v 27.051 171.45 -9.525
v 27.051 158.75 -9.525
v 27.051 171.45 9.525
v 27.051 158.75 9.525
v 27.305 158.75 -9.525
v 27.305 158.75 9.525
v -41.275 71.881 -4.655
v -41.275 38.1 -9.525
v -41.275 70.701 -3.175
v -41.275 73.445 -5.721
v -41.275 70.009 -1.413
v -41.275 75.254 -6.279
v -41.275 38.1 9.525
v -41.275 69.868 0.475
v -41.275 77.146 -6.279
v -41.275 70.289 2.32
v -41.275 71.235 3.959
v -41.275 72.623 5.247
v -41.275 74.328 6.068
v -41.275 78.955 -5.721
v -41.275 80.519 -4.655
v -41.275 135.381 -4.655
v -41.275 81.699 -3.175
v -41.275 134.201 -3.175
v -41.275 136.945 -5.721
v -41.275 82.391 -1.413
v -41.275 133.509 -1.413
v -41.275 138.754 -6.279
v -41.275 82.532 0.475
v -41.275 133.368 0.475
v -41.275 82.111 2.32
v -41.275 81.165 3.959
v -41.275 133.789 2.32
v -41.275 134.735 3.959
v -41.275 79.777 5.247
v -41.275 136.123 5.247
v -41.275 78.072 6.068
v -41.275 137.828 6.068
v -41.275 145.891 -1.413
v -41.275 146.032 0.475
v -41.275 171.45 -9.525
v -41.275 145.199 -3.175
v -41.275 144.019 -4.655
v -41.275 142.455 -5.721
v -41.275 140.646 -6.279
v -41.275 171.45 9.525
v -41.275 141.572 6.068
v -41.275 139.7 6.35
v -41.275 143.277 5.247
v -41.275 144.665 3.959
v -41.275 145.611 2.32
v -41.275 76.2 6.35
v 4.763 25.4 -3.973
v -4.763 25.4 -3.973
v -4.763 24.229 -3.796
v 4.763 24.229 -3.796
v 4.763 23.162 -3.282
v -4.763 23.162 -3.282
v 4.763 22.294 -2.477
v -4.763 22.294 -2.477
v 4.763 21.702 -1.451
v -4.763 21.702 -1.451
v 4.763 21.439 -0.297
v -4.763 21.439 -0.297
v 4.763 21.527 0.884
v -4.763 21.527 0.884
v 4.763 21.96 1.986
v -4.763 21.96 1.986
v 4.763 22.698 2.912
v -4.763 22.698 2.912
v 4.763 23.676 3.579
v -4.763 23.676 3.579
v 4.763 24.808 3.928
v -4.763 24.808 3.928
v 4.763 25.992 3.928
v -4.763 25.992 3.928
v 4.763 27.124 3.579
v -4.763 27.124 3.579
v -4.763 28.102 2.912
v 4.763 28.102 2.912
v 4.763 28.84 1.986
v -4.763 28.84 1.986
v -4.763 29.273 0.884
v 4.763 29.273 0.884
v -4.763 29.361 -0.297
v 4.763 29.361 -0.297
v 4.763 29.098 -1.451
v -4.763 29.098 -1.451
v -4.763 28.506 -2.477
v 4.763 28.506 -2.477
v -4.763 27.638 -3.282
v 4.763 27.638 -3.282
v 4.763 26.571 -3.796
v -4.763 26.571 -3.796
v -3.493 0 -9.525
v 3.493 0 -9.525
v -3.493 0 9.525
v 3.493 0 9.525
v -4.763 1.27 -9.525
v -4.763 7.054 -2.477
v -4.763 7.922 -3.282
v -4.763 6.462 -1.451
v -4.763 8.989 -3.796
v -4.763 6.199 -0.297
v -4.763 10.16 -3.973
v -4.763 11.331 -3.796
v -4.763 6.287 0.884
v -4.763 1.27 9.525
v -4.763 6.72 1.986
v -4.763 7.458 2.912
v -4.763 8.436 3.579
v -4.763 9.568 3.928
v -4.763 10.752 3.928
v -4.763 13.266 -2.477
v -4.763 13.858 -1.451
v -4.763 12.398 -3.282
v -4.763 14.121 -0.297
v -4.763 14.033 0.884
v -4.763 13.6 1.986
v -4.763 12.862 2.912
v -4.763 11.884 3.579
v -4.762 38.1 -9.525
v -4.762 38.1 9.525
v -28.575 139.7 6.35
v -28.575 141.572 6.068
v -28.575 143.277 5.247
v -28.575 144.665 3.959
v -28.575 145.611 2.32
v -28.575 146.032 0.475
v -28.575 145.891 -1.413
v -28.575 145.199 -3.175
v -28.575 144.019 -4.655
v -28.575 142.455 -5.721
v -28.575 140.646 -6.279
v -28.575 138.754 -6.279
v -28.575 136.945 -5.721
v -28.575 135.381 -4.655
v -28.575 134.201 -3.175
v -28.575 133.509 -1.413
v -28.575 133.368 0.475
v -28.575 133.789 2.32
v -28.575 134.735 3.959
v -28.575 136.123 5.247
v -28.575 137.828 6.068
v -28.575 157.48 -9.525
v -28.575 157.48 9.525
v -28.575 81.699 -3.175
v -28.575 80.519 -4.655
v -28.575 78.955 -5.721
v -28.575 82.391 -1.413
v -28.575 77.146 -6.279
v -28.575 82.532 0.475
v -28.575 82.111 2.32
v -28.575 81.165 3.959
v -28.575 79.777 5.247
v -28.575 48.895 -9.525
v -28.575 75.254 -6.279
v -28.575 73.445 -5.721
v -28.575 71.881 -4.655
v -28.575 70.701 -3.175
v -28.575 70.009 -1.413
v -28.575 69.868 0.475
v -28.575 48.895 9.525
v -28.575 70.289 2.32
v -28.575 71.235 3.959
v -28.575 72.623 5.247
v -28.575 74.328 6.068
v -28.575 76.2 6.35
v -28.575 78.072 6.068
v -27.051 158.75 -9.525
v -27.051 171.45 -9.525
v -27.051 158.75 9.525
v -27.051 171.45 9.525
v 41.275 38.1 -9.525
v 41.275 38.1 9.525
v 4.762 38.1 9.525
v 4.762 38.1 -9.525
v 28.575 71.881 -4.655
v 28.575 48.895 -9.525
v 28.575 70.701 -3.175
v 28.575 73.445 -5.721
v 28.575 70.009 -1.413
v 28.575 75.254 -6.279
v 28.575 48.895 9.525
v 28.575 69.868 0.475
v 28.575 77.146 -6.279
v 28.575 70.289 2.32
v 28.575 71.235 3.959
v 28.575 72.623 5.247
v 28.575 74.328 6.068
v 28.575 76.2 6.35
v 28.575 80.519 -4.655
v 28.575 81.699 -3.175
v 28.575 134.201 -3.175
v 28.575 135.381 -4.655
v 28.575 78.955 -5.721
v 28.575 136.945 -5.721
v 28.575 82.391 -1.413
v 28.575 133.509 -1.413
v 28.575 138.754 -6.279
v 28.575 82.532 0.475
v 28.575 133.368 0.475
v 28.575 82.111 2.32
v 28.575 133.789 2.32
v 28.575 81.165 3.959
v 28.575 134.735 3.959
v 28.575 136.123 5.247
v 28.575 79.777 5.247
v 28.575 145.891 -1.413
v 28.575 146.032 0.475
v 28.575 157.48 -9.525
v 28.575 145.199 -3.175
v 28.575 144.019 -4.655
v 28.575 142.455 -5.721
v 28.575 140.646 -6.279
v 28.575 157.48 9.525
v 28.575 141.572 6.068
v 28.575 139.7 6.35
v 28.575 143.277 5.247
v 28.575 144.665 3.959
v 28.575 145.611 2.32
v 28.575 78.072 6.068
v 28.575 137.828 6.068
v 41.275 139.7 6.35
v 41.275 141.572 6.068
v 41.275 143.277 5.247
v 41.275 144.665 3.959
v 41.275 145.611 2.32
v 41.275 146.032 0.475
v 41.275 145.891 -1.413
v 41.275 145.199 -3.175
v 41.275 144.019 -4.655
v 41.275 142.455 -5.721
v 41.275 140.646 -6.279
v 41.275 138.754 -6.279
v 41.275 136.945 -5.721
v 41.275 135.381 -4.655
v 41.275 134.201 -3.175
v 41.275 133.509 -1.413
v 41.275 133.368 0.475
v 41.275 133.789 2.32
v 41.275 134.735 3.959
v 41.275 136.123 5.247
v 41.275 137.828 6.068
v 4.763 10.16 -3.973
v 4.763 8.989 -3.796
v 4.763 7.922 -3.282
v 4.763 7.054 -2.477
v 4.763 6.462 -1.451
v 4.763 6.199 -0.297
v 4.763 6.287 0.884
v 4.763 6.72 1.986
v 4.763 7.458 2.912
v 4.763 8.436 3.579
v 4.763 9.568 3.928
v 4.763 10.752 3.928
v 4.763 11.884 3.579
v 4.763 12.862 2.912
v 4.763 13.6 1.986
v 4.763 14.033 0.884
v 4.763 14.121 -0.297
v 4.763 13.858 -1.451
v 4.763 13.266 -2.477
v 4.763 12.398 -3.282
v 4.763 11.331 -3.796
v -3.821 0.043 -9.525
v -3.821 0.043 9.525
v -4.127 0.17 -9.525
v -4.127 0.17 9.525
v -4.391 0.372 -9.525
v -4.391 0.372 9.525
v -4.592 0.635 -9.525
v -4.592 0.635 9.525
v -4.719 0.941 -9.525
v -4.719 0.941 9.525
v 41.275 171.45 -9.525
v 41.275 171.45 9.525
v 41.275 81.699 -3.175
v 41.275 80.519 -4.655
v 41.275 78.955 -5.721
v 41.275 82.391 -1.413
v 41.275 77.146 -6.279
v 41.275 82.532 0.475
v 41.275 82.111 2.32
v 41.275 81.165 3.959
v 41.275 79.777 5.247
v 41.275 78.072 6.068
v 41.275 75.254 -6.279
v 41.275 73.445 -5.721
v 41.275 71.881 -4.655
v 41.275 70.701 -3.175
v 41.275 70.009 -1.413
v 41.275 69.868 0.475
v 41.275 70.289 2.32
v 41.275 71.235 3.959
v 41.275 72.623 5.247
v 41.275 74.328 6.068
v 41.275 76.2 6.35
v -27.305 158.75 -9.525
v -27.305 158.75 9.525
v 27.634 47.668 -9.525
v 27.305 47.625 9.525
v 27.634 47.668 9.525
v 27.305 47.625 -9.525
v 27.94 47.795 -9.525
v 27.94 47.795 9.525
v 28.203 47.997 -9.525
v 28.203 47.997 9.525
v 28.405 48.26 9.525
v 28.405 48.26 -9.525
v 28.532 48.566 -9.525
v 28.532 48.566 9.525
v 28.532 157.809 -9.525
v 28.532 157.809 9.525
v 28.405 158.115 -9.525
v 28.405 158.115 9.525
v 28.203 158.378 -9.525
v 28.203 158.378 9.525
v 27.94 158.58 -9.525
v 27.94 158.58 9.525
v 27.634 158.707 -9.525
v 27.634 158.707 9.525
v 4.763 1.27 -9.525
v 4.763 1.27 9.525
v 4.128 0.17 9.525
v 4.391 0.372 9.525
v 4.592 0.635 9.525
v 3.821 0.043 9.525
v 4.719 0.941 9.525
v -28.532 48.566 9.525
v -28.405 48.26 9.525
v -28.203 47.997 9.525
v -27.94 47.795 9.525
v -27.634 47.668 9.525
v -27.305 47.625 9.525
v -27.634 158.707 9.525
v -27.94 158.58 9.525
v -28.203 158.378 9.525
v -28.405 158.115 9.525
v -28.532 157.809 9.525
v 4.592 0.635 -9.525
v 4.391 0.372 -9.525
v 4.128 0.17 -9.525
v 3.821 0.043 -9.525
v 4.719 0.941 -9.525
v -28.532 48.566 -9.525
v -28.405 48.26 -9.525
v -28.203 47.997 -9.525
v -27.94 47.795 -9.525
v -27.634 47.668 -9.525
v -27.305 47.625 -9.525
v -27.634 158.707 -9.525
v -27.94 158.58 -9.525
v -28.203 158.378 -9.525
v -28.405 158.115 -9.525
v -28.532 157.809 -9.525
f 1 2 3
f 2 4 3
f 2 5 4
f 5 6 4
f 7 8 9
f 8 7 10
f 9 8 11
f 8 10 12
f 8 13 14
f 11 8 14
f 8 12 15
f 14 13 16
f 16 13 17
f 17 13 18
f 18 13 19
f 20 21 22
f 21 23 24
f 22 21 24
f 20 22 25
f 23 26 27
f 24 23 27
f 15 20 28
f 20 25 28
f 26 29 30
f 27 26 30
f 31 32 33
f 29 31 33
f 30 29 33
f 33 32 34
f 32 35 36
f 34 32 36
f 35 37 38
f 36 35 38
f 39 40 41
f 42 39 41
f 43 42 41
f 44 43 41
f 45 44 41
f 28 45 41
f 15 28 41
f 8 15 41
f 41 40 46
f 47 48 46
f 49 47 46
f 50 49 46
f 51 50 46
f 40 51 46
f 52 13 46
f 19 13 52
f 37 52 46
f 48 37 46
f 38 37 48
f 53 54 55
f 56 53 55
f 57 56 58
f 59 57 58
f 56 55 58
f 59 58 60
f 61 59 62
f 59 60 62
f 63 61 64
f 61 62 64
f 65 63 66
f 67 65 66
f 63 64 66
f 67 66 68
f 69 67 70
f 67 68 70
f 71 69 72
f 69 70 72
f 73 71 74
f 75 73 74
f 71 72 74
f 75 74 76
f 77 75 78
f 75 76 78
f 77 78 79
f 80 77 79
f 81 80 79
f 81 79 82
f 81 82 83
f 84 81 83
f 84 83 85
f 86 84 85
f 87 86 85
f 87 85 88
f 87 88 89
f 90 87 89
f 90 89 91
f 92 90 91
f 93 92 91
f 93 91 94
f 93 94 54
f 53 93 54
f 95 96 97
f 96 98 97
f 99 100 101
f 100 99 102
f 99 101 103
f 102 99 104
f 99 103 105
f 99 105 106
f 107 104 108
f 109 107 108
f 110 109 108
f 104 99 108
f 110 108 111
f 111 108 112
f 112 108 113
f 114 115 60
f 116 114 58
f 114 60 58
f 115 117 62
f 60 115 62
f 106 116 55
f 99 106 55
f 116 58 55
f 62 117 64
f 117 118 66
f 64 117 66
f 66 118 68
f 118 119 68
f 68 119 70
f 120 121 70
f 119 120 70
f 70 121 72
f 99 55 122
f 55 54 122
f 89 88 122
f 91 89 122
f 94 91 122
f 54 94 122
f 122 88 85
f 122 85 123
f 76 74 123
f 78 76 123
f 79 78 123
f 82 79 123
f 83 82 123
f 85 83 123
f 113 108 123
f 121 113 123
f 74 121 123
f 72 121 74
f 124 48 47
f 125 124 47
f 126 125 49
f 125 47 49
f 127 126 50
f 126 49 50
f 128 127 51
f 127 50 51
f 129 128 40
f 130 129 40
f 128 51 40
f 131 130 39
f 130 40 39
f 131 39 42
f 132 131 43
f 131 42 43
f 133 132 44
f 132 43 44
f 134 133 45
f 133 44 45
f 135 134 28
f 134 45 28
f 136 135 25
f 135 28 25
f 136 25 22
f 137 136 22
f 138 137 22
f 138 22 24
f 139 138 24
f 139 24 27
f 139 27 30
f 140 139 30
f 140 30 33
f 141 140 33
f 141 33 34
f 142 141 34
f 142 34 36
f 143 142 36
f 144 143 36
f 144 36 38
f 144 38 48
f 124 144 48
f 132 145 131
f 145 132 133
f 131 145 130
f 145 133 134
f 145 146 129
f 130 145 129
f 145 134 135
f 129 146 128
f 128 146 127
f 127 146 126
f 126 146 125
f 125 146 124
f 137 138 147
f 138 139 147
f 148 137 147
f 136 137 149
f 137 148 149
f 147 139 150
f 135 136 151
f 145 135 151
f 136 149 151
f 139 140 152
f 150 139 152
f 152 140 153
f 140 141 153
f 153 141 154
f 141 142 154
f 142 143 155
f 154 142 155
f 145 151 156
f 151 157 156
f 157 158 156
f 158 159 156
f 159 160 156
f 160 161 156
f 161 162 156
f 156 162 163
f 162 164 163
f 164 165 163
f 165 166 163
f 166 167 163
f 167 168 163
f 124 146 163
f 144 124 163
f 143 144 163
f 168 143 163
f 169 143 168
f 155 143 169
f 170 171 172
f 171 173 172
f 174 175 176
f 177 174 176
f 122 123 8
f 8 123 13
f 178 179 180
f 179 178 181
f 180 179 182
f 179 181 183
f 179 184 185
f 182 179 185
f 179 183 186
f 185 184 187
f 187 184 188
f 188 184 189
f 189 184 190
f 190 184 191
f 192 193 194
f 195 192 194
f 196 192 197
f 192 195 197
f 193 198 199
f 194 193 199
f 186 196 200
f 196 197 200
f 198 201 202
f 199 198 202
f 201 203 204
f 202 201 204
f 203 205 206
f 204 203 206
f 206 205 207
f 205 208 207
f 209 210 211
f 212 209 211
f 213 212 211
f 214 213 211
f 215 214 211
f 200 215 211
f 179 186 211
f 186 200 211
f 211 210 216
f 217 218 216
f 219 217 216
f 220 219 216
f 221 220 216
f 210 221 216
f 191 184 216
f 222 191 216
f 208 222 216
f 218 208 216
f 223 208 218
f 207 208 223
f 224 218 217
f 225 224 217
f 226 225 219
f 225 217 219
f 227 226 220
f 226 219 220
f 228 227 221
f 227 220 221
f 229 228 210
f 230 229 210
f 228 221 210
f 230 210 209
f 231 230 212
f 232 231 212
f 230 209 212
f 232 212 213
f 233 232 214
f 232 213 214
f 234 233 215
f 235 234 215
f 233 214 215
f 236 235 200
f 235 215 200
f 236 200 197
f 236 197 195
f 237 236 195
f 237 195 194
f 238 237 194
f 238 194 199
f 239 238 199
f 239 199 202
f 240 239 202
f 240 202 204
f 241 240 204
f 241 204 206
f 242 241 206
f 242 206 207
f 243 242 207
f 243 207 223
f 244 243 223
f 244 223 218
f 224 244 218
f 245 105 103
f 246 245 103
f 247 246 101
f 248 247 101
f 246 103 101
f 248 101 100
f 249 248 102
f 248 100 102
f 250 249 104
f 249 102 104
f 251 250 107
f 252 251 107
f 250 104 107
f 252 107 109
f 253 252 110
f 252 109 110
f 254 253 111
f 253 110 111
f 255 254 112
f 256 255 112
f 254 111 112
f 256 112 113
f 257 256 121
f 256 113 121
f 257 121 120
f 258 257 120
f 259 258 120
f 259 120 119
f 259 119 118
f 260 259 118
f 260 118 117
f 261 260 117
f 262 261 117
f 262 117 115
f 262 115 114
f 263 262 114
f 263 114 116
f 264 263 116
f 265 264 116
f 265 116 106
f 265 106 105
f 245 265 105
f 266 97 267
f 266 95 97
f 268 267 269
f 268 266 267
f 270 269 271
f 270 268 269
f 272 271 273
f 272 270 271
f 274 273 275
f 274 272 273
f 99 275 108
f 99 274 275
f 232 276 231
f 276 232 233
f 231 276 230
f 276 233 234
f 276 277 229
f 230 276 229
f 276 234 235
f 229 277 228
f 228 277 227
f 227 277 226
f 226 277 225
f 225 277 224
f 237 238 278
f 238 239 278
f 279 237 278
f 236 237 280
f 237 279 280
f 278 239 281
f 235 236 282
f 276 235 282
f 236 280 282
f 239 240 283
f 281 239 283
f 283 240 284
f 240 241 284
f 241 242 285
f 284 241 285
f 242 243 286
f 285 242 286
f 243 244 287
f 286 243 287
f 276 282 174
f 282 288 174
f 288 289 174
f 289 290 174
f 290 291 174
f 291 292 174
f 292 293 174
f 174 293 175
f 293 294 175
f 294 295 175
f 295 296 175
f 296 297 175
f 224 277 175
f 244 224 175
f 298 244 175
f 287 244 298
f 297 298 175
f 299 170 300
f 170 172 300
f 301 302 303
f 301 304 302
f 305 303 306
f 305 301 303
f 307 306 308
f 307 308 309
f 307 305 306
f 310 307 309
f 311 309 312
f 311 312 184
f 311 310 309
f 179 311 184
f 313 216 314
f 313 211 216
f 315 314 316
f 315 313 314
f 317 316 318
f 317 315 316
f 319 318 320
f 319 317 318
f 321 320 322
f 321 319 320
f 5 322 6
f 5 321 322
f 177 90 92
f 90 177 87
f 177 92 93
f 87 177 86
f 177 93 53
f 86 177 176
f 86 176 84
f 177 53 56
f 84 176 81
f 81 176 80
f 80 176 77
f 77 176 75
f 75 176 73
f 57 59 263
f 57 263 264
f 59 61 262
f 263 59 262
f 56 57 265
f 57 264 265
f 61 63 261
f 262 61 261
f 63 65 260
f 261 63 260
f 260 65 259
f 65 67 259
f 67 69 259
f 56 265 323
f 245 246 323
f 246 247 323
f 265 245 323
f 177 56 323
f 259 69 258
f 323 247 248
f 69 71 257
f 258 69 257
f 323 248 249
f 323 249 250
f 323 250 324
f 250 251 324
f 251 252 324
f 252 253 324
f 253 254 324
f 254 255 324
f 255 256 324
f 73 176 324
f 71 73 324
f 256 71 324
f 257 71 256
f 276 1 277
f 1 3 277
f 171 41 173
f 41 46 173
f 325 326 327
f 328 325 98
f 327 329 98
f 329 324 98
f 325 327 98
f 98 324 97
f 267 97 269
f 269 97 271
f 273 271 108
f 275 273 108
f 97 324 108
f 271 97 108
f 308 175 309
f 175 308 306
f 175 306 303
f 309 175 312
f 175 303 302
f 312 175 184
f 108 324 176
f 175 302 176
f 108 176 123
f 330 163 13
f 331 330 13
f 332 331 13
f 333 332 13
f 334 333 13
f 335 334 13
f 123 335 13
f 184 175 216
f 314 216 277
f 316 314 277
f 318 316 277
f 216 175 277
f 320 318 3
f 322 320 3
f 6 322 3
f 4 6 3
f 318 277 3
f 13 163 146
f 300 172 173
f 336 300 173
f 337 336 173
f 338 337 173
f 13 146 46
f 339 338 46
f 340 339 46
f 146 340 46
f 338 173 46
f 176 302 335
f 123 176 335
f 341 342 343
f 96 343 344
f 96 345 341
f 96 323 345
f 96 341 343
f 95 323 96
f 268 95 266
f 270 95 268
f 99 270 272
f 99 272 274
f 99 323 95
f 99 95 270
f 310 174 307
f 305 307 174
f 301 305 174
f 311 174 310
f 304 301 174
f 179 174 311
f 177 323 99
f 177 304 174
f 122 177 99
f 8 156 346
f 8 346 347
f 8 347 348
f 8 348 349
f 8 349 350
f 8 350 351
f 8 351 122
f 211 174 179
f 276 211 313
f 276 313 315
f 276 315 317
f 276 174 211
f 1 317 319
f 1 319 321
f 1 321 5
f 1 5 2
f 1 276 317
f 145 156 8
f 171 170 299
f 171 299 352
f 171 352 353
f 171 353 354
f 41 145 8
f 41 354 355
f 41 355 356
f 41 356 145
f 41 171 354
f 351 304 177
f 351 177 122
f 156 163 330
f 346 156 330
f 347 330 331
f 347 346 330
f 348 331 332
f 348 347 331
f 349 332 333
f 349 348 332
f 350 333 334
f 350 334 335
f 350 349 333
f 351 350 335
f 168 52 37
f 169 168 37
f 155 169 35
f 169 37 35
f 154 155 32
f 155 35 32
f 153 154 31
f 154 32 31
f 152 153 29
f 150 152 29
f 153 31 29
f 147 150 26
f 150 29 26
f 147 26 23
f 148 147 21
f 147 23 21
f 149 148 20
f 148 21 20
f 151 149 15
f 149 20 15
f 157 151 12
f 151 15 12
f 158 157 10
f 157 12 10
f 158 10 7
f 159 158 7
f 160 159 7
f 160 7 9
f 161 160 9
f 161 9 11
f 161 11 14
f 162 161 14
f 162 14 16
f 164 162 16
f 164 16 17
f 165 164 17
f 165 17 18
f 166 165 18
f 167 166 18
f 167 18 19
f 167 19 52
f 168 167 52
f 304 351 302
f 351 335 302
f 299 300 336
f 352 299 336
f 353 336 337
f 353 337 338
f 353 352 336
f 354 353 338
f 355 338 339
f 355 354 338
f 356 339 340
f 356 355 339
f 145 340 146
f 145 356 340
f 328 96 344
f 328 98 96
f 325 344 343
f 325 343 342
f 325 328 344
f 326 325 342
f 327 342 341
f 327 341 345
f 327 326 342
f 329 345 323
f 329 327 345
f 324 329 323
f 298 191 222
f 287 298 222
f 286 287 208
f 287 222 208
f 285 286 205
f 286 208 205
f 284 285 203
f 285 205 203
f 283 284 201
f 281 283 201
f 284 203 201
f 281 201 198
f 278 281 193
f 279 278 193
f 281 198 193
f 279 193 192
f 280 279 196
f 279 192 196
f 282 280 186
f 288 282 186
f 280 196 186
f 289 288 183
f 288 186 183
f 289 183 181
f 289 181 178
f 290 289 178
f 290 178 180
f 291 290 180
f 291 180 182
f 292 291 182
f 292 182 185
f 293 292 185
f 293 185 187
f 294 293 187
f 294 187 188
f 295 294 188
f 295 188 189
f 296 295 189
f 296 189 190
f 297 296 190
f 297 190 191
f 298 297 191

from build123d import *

# Parameters (mm, degrees)
BOSS_EXTRUDE1_DEPTH = 9.525
SKETCH2_R           = 6.35
CUT_EXTRUDE1_DEPTH  = 83.55
FILLET1_R           = 1.27
HOLE1_D             = 7.94512
HOLE1_DEPTH         = 46.0375
HOLE1_TIP           = 2.386954861


with BuildPart() as part:
    # Sketch1 → Boss-Extrude1 (new body, symmetric)
    with BuildSketch(Plane.XY):
        Polygon((4.7625, 0), (-4.7625, 0), (-4.7625, 38.1), (-41.275, 38.1), (-41.275, 171.45), (-27.051, 171.45), (-27.051, 158.75), (-28.575, 158.75), (-28.575, 47.625), (28.575, 47.625), (28.575, 158.75), (27.051, 158.75), (27.051, 171.45), (41.275, 171.45), (41.275, 38.1), (4.7625, 38.1), align=None)
    extrude(amount=BOSS_EXTRUDE1_DEPTH, both=True)

    # Sketch2 → Cut-Extrude1 (cut, through all)
    with BuildSketch(Plane.ZY.offset(41.275)):
        with Locations((0, 76.2)):
            Circle(SKETCH2_R)
        with Locations((0, 139.7)):
            Circle(SKETCH2_R)
    extrude(amount=-CUT_EXTRUDE1_DEPTH, mode=Mode.SUBTRACT)

    # Fillet1
    fillet1_edges = [part.edges().sort_by_distance(p)[0] for p in [
        (4.7625, 0, 0),
        (-4.7625, 0, 0),
        (-28.575, 158.75, 0),
        (-28.575, 47.625, 0),
        (28.575, 47.625, 0),
        (28.575, 158.75, 0),
    ]]
    fillet(fillet1_edges, radius=FILLET1_R)

    # Hole1
    with Locations(Plane(origin=(4.7625, 0, 0), x_dir=(0, 0, 1), z_dir=(1, 0, 0))):
        with Locations((0, -25.4), (0, -10.16)):
            Hole(HOLE1_D / 2, depth=HOLE1_DEPTH)
            with Locations((0, 0, -(HOLE1_DEPTH + HOLE1_TIP / 2))):  # 118° drill point
                Cone(0, HOLE1_D / 2, HOLE1_TIP, mode=Mode.SUBTRACT)


solid = part.part
